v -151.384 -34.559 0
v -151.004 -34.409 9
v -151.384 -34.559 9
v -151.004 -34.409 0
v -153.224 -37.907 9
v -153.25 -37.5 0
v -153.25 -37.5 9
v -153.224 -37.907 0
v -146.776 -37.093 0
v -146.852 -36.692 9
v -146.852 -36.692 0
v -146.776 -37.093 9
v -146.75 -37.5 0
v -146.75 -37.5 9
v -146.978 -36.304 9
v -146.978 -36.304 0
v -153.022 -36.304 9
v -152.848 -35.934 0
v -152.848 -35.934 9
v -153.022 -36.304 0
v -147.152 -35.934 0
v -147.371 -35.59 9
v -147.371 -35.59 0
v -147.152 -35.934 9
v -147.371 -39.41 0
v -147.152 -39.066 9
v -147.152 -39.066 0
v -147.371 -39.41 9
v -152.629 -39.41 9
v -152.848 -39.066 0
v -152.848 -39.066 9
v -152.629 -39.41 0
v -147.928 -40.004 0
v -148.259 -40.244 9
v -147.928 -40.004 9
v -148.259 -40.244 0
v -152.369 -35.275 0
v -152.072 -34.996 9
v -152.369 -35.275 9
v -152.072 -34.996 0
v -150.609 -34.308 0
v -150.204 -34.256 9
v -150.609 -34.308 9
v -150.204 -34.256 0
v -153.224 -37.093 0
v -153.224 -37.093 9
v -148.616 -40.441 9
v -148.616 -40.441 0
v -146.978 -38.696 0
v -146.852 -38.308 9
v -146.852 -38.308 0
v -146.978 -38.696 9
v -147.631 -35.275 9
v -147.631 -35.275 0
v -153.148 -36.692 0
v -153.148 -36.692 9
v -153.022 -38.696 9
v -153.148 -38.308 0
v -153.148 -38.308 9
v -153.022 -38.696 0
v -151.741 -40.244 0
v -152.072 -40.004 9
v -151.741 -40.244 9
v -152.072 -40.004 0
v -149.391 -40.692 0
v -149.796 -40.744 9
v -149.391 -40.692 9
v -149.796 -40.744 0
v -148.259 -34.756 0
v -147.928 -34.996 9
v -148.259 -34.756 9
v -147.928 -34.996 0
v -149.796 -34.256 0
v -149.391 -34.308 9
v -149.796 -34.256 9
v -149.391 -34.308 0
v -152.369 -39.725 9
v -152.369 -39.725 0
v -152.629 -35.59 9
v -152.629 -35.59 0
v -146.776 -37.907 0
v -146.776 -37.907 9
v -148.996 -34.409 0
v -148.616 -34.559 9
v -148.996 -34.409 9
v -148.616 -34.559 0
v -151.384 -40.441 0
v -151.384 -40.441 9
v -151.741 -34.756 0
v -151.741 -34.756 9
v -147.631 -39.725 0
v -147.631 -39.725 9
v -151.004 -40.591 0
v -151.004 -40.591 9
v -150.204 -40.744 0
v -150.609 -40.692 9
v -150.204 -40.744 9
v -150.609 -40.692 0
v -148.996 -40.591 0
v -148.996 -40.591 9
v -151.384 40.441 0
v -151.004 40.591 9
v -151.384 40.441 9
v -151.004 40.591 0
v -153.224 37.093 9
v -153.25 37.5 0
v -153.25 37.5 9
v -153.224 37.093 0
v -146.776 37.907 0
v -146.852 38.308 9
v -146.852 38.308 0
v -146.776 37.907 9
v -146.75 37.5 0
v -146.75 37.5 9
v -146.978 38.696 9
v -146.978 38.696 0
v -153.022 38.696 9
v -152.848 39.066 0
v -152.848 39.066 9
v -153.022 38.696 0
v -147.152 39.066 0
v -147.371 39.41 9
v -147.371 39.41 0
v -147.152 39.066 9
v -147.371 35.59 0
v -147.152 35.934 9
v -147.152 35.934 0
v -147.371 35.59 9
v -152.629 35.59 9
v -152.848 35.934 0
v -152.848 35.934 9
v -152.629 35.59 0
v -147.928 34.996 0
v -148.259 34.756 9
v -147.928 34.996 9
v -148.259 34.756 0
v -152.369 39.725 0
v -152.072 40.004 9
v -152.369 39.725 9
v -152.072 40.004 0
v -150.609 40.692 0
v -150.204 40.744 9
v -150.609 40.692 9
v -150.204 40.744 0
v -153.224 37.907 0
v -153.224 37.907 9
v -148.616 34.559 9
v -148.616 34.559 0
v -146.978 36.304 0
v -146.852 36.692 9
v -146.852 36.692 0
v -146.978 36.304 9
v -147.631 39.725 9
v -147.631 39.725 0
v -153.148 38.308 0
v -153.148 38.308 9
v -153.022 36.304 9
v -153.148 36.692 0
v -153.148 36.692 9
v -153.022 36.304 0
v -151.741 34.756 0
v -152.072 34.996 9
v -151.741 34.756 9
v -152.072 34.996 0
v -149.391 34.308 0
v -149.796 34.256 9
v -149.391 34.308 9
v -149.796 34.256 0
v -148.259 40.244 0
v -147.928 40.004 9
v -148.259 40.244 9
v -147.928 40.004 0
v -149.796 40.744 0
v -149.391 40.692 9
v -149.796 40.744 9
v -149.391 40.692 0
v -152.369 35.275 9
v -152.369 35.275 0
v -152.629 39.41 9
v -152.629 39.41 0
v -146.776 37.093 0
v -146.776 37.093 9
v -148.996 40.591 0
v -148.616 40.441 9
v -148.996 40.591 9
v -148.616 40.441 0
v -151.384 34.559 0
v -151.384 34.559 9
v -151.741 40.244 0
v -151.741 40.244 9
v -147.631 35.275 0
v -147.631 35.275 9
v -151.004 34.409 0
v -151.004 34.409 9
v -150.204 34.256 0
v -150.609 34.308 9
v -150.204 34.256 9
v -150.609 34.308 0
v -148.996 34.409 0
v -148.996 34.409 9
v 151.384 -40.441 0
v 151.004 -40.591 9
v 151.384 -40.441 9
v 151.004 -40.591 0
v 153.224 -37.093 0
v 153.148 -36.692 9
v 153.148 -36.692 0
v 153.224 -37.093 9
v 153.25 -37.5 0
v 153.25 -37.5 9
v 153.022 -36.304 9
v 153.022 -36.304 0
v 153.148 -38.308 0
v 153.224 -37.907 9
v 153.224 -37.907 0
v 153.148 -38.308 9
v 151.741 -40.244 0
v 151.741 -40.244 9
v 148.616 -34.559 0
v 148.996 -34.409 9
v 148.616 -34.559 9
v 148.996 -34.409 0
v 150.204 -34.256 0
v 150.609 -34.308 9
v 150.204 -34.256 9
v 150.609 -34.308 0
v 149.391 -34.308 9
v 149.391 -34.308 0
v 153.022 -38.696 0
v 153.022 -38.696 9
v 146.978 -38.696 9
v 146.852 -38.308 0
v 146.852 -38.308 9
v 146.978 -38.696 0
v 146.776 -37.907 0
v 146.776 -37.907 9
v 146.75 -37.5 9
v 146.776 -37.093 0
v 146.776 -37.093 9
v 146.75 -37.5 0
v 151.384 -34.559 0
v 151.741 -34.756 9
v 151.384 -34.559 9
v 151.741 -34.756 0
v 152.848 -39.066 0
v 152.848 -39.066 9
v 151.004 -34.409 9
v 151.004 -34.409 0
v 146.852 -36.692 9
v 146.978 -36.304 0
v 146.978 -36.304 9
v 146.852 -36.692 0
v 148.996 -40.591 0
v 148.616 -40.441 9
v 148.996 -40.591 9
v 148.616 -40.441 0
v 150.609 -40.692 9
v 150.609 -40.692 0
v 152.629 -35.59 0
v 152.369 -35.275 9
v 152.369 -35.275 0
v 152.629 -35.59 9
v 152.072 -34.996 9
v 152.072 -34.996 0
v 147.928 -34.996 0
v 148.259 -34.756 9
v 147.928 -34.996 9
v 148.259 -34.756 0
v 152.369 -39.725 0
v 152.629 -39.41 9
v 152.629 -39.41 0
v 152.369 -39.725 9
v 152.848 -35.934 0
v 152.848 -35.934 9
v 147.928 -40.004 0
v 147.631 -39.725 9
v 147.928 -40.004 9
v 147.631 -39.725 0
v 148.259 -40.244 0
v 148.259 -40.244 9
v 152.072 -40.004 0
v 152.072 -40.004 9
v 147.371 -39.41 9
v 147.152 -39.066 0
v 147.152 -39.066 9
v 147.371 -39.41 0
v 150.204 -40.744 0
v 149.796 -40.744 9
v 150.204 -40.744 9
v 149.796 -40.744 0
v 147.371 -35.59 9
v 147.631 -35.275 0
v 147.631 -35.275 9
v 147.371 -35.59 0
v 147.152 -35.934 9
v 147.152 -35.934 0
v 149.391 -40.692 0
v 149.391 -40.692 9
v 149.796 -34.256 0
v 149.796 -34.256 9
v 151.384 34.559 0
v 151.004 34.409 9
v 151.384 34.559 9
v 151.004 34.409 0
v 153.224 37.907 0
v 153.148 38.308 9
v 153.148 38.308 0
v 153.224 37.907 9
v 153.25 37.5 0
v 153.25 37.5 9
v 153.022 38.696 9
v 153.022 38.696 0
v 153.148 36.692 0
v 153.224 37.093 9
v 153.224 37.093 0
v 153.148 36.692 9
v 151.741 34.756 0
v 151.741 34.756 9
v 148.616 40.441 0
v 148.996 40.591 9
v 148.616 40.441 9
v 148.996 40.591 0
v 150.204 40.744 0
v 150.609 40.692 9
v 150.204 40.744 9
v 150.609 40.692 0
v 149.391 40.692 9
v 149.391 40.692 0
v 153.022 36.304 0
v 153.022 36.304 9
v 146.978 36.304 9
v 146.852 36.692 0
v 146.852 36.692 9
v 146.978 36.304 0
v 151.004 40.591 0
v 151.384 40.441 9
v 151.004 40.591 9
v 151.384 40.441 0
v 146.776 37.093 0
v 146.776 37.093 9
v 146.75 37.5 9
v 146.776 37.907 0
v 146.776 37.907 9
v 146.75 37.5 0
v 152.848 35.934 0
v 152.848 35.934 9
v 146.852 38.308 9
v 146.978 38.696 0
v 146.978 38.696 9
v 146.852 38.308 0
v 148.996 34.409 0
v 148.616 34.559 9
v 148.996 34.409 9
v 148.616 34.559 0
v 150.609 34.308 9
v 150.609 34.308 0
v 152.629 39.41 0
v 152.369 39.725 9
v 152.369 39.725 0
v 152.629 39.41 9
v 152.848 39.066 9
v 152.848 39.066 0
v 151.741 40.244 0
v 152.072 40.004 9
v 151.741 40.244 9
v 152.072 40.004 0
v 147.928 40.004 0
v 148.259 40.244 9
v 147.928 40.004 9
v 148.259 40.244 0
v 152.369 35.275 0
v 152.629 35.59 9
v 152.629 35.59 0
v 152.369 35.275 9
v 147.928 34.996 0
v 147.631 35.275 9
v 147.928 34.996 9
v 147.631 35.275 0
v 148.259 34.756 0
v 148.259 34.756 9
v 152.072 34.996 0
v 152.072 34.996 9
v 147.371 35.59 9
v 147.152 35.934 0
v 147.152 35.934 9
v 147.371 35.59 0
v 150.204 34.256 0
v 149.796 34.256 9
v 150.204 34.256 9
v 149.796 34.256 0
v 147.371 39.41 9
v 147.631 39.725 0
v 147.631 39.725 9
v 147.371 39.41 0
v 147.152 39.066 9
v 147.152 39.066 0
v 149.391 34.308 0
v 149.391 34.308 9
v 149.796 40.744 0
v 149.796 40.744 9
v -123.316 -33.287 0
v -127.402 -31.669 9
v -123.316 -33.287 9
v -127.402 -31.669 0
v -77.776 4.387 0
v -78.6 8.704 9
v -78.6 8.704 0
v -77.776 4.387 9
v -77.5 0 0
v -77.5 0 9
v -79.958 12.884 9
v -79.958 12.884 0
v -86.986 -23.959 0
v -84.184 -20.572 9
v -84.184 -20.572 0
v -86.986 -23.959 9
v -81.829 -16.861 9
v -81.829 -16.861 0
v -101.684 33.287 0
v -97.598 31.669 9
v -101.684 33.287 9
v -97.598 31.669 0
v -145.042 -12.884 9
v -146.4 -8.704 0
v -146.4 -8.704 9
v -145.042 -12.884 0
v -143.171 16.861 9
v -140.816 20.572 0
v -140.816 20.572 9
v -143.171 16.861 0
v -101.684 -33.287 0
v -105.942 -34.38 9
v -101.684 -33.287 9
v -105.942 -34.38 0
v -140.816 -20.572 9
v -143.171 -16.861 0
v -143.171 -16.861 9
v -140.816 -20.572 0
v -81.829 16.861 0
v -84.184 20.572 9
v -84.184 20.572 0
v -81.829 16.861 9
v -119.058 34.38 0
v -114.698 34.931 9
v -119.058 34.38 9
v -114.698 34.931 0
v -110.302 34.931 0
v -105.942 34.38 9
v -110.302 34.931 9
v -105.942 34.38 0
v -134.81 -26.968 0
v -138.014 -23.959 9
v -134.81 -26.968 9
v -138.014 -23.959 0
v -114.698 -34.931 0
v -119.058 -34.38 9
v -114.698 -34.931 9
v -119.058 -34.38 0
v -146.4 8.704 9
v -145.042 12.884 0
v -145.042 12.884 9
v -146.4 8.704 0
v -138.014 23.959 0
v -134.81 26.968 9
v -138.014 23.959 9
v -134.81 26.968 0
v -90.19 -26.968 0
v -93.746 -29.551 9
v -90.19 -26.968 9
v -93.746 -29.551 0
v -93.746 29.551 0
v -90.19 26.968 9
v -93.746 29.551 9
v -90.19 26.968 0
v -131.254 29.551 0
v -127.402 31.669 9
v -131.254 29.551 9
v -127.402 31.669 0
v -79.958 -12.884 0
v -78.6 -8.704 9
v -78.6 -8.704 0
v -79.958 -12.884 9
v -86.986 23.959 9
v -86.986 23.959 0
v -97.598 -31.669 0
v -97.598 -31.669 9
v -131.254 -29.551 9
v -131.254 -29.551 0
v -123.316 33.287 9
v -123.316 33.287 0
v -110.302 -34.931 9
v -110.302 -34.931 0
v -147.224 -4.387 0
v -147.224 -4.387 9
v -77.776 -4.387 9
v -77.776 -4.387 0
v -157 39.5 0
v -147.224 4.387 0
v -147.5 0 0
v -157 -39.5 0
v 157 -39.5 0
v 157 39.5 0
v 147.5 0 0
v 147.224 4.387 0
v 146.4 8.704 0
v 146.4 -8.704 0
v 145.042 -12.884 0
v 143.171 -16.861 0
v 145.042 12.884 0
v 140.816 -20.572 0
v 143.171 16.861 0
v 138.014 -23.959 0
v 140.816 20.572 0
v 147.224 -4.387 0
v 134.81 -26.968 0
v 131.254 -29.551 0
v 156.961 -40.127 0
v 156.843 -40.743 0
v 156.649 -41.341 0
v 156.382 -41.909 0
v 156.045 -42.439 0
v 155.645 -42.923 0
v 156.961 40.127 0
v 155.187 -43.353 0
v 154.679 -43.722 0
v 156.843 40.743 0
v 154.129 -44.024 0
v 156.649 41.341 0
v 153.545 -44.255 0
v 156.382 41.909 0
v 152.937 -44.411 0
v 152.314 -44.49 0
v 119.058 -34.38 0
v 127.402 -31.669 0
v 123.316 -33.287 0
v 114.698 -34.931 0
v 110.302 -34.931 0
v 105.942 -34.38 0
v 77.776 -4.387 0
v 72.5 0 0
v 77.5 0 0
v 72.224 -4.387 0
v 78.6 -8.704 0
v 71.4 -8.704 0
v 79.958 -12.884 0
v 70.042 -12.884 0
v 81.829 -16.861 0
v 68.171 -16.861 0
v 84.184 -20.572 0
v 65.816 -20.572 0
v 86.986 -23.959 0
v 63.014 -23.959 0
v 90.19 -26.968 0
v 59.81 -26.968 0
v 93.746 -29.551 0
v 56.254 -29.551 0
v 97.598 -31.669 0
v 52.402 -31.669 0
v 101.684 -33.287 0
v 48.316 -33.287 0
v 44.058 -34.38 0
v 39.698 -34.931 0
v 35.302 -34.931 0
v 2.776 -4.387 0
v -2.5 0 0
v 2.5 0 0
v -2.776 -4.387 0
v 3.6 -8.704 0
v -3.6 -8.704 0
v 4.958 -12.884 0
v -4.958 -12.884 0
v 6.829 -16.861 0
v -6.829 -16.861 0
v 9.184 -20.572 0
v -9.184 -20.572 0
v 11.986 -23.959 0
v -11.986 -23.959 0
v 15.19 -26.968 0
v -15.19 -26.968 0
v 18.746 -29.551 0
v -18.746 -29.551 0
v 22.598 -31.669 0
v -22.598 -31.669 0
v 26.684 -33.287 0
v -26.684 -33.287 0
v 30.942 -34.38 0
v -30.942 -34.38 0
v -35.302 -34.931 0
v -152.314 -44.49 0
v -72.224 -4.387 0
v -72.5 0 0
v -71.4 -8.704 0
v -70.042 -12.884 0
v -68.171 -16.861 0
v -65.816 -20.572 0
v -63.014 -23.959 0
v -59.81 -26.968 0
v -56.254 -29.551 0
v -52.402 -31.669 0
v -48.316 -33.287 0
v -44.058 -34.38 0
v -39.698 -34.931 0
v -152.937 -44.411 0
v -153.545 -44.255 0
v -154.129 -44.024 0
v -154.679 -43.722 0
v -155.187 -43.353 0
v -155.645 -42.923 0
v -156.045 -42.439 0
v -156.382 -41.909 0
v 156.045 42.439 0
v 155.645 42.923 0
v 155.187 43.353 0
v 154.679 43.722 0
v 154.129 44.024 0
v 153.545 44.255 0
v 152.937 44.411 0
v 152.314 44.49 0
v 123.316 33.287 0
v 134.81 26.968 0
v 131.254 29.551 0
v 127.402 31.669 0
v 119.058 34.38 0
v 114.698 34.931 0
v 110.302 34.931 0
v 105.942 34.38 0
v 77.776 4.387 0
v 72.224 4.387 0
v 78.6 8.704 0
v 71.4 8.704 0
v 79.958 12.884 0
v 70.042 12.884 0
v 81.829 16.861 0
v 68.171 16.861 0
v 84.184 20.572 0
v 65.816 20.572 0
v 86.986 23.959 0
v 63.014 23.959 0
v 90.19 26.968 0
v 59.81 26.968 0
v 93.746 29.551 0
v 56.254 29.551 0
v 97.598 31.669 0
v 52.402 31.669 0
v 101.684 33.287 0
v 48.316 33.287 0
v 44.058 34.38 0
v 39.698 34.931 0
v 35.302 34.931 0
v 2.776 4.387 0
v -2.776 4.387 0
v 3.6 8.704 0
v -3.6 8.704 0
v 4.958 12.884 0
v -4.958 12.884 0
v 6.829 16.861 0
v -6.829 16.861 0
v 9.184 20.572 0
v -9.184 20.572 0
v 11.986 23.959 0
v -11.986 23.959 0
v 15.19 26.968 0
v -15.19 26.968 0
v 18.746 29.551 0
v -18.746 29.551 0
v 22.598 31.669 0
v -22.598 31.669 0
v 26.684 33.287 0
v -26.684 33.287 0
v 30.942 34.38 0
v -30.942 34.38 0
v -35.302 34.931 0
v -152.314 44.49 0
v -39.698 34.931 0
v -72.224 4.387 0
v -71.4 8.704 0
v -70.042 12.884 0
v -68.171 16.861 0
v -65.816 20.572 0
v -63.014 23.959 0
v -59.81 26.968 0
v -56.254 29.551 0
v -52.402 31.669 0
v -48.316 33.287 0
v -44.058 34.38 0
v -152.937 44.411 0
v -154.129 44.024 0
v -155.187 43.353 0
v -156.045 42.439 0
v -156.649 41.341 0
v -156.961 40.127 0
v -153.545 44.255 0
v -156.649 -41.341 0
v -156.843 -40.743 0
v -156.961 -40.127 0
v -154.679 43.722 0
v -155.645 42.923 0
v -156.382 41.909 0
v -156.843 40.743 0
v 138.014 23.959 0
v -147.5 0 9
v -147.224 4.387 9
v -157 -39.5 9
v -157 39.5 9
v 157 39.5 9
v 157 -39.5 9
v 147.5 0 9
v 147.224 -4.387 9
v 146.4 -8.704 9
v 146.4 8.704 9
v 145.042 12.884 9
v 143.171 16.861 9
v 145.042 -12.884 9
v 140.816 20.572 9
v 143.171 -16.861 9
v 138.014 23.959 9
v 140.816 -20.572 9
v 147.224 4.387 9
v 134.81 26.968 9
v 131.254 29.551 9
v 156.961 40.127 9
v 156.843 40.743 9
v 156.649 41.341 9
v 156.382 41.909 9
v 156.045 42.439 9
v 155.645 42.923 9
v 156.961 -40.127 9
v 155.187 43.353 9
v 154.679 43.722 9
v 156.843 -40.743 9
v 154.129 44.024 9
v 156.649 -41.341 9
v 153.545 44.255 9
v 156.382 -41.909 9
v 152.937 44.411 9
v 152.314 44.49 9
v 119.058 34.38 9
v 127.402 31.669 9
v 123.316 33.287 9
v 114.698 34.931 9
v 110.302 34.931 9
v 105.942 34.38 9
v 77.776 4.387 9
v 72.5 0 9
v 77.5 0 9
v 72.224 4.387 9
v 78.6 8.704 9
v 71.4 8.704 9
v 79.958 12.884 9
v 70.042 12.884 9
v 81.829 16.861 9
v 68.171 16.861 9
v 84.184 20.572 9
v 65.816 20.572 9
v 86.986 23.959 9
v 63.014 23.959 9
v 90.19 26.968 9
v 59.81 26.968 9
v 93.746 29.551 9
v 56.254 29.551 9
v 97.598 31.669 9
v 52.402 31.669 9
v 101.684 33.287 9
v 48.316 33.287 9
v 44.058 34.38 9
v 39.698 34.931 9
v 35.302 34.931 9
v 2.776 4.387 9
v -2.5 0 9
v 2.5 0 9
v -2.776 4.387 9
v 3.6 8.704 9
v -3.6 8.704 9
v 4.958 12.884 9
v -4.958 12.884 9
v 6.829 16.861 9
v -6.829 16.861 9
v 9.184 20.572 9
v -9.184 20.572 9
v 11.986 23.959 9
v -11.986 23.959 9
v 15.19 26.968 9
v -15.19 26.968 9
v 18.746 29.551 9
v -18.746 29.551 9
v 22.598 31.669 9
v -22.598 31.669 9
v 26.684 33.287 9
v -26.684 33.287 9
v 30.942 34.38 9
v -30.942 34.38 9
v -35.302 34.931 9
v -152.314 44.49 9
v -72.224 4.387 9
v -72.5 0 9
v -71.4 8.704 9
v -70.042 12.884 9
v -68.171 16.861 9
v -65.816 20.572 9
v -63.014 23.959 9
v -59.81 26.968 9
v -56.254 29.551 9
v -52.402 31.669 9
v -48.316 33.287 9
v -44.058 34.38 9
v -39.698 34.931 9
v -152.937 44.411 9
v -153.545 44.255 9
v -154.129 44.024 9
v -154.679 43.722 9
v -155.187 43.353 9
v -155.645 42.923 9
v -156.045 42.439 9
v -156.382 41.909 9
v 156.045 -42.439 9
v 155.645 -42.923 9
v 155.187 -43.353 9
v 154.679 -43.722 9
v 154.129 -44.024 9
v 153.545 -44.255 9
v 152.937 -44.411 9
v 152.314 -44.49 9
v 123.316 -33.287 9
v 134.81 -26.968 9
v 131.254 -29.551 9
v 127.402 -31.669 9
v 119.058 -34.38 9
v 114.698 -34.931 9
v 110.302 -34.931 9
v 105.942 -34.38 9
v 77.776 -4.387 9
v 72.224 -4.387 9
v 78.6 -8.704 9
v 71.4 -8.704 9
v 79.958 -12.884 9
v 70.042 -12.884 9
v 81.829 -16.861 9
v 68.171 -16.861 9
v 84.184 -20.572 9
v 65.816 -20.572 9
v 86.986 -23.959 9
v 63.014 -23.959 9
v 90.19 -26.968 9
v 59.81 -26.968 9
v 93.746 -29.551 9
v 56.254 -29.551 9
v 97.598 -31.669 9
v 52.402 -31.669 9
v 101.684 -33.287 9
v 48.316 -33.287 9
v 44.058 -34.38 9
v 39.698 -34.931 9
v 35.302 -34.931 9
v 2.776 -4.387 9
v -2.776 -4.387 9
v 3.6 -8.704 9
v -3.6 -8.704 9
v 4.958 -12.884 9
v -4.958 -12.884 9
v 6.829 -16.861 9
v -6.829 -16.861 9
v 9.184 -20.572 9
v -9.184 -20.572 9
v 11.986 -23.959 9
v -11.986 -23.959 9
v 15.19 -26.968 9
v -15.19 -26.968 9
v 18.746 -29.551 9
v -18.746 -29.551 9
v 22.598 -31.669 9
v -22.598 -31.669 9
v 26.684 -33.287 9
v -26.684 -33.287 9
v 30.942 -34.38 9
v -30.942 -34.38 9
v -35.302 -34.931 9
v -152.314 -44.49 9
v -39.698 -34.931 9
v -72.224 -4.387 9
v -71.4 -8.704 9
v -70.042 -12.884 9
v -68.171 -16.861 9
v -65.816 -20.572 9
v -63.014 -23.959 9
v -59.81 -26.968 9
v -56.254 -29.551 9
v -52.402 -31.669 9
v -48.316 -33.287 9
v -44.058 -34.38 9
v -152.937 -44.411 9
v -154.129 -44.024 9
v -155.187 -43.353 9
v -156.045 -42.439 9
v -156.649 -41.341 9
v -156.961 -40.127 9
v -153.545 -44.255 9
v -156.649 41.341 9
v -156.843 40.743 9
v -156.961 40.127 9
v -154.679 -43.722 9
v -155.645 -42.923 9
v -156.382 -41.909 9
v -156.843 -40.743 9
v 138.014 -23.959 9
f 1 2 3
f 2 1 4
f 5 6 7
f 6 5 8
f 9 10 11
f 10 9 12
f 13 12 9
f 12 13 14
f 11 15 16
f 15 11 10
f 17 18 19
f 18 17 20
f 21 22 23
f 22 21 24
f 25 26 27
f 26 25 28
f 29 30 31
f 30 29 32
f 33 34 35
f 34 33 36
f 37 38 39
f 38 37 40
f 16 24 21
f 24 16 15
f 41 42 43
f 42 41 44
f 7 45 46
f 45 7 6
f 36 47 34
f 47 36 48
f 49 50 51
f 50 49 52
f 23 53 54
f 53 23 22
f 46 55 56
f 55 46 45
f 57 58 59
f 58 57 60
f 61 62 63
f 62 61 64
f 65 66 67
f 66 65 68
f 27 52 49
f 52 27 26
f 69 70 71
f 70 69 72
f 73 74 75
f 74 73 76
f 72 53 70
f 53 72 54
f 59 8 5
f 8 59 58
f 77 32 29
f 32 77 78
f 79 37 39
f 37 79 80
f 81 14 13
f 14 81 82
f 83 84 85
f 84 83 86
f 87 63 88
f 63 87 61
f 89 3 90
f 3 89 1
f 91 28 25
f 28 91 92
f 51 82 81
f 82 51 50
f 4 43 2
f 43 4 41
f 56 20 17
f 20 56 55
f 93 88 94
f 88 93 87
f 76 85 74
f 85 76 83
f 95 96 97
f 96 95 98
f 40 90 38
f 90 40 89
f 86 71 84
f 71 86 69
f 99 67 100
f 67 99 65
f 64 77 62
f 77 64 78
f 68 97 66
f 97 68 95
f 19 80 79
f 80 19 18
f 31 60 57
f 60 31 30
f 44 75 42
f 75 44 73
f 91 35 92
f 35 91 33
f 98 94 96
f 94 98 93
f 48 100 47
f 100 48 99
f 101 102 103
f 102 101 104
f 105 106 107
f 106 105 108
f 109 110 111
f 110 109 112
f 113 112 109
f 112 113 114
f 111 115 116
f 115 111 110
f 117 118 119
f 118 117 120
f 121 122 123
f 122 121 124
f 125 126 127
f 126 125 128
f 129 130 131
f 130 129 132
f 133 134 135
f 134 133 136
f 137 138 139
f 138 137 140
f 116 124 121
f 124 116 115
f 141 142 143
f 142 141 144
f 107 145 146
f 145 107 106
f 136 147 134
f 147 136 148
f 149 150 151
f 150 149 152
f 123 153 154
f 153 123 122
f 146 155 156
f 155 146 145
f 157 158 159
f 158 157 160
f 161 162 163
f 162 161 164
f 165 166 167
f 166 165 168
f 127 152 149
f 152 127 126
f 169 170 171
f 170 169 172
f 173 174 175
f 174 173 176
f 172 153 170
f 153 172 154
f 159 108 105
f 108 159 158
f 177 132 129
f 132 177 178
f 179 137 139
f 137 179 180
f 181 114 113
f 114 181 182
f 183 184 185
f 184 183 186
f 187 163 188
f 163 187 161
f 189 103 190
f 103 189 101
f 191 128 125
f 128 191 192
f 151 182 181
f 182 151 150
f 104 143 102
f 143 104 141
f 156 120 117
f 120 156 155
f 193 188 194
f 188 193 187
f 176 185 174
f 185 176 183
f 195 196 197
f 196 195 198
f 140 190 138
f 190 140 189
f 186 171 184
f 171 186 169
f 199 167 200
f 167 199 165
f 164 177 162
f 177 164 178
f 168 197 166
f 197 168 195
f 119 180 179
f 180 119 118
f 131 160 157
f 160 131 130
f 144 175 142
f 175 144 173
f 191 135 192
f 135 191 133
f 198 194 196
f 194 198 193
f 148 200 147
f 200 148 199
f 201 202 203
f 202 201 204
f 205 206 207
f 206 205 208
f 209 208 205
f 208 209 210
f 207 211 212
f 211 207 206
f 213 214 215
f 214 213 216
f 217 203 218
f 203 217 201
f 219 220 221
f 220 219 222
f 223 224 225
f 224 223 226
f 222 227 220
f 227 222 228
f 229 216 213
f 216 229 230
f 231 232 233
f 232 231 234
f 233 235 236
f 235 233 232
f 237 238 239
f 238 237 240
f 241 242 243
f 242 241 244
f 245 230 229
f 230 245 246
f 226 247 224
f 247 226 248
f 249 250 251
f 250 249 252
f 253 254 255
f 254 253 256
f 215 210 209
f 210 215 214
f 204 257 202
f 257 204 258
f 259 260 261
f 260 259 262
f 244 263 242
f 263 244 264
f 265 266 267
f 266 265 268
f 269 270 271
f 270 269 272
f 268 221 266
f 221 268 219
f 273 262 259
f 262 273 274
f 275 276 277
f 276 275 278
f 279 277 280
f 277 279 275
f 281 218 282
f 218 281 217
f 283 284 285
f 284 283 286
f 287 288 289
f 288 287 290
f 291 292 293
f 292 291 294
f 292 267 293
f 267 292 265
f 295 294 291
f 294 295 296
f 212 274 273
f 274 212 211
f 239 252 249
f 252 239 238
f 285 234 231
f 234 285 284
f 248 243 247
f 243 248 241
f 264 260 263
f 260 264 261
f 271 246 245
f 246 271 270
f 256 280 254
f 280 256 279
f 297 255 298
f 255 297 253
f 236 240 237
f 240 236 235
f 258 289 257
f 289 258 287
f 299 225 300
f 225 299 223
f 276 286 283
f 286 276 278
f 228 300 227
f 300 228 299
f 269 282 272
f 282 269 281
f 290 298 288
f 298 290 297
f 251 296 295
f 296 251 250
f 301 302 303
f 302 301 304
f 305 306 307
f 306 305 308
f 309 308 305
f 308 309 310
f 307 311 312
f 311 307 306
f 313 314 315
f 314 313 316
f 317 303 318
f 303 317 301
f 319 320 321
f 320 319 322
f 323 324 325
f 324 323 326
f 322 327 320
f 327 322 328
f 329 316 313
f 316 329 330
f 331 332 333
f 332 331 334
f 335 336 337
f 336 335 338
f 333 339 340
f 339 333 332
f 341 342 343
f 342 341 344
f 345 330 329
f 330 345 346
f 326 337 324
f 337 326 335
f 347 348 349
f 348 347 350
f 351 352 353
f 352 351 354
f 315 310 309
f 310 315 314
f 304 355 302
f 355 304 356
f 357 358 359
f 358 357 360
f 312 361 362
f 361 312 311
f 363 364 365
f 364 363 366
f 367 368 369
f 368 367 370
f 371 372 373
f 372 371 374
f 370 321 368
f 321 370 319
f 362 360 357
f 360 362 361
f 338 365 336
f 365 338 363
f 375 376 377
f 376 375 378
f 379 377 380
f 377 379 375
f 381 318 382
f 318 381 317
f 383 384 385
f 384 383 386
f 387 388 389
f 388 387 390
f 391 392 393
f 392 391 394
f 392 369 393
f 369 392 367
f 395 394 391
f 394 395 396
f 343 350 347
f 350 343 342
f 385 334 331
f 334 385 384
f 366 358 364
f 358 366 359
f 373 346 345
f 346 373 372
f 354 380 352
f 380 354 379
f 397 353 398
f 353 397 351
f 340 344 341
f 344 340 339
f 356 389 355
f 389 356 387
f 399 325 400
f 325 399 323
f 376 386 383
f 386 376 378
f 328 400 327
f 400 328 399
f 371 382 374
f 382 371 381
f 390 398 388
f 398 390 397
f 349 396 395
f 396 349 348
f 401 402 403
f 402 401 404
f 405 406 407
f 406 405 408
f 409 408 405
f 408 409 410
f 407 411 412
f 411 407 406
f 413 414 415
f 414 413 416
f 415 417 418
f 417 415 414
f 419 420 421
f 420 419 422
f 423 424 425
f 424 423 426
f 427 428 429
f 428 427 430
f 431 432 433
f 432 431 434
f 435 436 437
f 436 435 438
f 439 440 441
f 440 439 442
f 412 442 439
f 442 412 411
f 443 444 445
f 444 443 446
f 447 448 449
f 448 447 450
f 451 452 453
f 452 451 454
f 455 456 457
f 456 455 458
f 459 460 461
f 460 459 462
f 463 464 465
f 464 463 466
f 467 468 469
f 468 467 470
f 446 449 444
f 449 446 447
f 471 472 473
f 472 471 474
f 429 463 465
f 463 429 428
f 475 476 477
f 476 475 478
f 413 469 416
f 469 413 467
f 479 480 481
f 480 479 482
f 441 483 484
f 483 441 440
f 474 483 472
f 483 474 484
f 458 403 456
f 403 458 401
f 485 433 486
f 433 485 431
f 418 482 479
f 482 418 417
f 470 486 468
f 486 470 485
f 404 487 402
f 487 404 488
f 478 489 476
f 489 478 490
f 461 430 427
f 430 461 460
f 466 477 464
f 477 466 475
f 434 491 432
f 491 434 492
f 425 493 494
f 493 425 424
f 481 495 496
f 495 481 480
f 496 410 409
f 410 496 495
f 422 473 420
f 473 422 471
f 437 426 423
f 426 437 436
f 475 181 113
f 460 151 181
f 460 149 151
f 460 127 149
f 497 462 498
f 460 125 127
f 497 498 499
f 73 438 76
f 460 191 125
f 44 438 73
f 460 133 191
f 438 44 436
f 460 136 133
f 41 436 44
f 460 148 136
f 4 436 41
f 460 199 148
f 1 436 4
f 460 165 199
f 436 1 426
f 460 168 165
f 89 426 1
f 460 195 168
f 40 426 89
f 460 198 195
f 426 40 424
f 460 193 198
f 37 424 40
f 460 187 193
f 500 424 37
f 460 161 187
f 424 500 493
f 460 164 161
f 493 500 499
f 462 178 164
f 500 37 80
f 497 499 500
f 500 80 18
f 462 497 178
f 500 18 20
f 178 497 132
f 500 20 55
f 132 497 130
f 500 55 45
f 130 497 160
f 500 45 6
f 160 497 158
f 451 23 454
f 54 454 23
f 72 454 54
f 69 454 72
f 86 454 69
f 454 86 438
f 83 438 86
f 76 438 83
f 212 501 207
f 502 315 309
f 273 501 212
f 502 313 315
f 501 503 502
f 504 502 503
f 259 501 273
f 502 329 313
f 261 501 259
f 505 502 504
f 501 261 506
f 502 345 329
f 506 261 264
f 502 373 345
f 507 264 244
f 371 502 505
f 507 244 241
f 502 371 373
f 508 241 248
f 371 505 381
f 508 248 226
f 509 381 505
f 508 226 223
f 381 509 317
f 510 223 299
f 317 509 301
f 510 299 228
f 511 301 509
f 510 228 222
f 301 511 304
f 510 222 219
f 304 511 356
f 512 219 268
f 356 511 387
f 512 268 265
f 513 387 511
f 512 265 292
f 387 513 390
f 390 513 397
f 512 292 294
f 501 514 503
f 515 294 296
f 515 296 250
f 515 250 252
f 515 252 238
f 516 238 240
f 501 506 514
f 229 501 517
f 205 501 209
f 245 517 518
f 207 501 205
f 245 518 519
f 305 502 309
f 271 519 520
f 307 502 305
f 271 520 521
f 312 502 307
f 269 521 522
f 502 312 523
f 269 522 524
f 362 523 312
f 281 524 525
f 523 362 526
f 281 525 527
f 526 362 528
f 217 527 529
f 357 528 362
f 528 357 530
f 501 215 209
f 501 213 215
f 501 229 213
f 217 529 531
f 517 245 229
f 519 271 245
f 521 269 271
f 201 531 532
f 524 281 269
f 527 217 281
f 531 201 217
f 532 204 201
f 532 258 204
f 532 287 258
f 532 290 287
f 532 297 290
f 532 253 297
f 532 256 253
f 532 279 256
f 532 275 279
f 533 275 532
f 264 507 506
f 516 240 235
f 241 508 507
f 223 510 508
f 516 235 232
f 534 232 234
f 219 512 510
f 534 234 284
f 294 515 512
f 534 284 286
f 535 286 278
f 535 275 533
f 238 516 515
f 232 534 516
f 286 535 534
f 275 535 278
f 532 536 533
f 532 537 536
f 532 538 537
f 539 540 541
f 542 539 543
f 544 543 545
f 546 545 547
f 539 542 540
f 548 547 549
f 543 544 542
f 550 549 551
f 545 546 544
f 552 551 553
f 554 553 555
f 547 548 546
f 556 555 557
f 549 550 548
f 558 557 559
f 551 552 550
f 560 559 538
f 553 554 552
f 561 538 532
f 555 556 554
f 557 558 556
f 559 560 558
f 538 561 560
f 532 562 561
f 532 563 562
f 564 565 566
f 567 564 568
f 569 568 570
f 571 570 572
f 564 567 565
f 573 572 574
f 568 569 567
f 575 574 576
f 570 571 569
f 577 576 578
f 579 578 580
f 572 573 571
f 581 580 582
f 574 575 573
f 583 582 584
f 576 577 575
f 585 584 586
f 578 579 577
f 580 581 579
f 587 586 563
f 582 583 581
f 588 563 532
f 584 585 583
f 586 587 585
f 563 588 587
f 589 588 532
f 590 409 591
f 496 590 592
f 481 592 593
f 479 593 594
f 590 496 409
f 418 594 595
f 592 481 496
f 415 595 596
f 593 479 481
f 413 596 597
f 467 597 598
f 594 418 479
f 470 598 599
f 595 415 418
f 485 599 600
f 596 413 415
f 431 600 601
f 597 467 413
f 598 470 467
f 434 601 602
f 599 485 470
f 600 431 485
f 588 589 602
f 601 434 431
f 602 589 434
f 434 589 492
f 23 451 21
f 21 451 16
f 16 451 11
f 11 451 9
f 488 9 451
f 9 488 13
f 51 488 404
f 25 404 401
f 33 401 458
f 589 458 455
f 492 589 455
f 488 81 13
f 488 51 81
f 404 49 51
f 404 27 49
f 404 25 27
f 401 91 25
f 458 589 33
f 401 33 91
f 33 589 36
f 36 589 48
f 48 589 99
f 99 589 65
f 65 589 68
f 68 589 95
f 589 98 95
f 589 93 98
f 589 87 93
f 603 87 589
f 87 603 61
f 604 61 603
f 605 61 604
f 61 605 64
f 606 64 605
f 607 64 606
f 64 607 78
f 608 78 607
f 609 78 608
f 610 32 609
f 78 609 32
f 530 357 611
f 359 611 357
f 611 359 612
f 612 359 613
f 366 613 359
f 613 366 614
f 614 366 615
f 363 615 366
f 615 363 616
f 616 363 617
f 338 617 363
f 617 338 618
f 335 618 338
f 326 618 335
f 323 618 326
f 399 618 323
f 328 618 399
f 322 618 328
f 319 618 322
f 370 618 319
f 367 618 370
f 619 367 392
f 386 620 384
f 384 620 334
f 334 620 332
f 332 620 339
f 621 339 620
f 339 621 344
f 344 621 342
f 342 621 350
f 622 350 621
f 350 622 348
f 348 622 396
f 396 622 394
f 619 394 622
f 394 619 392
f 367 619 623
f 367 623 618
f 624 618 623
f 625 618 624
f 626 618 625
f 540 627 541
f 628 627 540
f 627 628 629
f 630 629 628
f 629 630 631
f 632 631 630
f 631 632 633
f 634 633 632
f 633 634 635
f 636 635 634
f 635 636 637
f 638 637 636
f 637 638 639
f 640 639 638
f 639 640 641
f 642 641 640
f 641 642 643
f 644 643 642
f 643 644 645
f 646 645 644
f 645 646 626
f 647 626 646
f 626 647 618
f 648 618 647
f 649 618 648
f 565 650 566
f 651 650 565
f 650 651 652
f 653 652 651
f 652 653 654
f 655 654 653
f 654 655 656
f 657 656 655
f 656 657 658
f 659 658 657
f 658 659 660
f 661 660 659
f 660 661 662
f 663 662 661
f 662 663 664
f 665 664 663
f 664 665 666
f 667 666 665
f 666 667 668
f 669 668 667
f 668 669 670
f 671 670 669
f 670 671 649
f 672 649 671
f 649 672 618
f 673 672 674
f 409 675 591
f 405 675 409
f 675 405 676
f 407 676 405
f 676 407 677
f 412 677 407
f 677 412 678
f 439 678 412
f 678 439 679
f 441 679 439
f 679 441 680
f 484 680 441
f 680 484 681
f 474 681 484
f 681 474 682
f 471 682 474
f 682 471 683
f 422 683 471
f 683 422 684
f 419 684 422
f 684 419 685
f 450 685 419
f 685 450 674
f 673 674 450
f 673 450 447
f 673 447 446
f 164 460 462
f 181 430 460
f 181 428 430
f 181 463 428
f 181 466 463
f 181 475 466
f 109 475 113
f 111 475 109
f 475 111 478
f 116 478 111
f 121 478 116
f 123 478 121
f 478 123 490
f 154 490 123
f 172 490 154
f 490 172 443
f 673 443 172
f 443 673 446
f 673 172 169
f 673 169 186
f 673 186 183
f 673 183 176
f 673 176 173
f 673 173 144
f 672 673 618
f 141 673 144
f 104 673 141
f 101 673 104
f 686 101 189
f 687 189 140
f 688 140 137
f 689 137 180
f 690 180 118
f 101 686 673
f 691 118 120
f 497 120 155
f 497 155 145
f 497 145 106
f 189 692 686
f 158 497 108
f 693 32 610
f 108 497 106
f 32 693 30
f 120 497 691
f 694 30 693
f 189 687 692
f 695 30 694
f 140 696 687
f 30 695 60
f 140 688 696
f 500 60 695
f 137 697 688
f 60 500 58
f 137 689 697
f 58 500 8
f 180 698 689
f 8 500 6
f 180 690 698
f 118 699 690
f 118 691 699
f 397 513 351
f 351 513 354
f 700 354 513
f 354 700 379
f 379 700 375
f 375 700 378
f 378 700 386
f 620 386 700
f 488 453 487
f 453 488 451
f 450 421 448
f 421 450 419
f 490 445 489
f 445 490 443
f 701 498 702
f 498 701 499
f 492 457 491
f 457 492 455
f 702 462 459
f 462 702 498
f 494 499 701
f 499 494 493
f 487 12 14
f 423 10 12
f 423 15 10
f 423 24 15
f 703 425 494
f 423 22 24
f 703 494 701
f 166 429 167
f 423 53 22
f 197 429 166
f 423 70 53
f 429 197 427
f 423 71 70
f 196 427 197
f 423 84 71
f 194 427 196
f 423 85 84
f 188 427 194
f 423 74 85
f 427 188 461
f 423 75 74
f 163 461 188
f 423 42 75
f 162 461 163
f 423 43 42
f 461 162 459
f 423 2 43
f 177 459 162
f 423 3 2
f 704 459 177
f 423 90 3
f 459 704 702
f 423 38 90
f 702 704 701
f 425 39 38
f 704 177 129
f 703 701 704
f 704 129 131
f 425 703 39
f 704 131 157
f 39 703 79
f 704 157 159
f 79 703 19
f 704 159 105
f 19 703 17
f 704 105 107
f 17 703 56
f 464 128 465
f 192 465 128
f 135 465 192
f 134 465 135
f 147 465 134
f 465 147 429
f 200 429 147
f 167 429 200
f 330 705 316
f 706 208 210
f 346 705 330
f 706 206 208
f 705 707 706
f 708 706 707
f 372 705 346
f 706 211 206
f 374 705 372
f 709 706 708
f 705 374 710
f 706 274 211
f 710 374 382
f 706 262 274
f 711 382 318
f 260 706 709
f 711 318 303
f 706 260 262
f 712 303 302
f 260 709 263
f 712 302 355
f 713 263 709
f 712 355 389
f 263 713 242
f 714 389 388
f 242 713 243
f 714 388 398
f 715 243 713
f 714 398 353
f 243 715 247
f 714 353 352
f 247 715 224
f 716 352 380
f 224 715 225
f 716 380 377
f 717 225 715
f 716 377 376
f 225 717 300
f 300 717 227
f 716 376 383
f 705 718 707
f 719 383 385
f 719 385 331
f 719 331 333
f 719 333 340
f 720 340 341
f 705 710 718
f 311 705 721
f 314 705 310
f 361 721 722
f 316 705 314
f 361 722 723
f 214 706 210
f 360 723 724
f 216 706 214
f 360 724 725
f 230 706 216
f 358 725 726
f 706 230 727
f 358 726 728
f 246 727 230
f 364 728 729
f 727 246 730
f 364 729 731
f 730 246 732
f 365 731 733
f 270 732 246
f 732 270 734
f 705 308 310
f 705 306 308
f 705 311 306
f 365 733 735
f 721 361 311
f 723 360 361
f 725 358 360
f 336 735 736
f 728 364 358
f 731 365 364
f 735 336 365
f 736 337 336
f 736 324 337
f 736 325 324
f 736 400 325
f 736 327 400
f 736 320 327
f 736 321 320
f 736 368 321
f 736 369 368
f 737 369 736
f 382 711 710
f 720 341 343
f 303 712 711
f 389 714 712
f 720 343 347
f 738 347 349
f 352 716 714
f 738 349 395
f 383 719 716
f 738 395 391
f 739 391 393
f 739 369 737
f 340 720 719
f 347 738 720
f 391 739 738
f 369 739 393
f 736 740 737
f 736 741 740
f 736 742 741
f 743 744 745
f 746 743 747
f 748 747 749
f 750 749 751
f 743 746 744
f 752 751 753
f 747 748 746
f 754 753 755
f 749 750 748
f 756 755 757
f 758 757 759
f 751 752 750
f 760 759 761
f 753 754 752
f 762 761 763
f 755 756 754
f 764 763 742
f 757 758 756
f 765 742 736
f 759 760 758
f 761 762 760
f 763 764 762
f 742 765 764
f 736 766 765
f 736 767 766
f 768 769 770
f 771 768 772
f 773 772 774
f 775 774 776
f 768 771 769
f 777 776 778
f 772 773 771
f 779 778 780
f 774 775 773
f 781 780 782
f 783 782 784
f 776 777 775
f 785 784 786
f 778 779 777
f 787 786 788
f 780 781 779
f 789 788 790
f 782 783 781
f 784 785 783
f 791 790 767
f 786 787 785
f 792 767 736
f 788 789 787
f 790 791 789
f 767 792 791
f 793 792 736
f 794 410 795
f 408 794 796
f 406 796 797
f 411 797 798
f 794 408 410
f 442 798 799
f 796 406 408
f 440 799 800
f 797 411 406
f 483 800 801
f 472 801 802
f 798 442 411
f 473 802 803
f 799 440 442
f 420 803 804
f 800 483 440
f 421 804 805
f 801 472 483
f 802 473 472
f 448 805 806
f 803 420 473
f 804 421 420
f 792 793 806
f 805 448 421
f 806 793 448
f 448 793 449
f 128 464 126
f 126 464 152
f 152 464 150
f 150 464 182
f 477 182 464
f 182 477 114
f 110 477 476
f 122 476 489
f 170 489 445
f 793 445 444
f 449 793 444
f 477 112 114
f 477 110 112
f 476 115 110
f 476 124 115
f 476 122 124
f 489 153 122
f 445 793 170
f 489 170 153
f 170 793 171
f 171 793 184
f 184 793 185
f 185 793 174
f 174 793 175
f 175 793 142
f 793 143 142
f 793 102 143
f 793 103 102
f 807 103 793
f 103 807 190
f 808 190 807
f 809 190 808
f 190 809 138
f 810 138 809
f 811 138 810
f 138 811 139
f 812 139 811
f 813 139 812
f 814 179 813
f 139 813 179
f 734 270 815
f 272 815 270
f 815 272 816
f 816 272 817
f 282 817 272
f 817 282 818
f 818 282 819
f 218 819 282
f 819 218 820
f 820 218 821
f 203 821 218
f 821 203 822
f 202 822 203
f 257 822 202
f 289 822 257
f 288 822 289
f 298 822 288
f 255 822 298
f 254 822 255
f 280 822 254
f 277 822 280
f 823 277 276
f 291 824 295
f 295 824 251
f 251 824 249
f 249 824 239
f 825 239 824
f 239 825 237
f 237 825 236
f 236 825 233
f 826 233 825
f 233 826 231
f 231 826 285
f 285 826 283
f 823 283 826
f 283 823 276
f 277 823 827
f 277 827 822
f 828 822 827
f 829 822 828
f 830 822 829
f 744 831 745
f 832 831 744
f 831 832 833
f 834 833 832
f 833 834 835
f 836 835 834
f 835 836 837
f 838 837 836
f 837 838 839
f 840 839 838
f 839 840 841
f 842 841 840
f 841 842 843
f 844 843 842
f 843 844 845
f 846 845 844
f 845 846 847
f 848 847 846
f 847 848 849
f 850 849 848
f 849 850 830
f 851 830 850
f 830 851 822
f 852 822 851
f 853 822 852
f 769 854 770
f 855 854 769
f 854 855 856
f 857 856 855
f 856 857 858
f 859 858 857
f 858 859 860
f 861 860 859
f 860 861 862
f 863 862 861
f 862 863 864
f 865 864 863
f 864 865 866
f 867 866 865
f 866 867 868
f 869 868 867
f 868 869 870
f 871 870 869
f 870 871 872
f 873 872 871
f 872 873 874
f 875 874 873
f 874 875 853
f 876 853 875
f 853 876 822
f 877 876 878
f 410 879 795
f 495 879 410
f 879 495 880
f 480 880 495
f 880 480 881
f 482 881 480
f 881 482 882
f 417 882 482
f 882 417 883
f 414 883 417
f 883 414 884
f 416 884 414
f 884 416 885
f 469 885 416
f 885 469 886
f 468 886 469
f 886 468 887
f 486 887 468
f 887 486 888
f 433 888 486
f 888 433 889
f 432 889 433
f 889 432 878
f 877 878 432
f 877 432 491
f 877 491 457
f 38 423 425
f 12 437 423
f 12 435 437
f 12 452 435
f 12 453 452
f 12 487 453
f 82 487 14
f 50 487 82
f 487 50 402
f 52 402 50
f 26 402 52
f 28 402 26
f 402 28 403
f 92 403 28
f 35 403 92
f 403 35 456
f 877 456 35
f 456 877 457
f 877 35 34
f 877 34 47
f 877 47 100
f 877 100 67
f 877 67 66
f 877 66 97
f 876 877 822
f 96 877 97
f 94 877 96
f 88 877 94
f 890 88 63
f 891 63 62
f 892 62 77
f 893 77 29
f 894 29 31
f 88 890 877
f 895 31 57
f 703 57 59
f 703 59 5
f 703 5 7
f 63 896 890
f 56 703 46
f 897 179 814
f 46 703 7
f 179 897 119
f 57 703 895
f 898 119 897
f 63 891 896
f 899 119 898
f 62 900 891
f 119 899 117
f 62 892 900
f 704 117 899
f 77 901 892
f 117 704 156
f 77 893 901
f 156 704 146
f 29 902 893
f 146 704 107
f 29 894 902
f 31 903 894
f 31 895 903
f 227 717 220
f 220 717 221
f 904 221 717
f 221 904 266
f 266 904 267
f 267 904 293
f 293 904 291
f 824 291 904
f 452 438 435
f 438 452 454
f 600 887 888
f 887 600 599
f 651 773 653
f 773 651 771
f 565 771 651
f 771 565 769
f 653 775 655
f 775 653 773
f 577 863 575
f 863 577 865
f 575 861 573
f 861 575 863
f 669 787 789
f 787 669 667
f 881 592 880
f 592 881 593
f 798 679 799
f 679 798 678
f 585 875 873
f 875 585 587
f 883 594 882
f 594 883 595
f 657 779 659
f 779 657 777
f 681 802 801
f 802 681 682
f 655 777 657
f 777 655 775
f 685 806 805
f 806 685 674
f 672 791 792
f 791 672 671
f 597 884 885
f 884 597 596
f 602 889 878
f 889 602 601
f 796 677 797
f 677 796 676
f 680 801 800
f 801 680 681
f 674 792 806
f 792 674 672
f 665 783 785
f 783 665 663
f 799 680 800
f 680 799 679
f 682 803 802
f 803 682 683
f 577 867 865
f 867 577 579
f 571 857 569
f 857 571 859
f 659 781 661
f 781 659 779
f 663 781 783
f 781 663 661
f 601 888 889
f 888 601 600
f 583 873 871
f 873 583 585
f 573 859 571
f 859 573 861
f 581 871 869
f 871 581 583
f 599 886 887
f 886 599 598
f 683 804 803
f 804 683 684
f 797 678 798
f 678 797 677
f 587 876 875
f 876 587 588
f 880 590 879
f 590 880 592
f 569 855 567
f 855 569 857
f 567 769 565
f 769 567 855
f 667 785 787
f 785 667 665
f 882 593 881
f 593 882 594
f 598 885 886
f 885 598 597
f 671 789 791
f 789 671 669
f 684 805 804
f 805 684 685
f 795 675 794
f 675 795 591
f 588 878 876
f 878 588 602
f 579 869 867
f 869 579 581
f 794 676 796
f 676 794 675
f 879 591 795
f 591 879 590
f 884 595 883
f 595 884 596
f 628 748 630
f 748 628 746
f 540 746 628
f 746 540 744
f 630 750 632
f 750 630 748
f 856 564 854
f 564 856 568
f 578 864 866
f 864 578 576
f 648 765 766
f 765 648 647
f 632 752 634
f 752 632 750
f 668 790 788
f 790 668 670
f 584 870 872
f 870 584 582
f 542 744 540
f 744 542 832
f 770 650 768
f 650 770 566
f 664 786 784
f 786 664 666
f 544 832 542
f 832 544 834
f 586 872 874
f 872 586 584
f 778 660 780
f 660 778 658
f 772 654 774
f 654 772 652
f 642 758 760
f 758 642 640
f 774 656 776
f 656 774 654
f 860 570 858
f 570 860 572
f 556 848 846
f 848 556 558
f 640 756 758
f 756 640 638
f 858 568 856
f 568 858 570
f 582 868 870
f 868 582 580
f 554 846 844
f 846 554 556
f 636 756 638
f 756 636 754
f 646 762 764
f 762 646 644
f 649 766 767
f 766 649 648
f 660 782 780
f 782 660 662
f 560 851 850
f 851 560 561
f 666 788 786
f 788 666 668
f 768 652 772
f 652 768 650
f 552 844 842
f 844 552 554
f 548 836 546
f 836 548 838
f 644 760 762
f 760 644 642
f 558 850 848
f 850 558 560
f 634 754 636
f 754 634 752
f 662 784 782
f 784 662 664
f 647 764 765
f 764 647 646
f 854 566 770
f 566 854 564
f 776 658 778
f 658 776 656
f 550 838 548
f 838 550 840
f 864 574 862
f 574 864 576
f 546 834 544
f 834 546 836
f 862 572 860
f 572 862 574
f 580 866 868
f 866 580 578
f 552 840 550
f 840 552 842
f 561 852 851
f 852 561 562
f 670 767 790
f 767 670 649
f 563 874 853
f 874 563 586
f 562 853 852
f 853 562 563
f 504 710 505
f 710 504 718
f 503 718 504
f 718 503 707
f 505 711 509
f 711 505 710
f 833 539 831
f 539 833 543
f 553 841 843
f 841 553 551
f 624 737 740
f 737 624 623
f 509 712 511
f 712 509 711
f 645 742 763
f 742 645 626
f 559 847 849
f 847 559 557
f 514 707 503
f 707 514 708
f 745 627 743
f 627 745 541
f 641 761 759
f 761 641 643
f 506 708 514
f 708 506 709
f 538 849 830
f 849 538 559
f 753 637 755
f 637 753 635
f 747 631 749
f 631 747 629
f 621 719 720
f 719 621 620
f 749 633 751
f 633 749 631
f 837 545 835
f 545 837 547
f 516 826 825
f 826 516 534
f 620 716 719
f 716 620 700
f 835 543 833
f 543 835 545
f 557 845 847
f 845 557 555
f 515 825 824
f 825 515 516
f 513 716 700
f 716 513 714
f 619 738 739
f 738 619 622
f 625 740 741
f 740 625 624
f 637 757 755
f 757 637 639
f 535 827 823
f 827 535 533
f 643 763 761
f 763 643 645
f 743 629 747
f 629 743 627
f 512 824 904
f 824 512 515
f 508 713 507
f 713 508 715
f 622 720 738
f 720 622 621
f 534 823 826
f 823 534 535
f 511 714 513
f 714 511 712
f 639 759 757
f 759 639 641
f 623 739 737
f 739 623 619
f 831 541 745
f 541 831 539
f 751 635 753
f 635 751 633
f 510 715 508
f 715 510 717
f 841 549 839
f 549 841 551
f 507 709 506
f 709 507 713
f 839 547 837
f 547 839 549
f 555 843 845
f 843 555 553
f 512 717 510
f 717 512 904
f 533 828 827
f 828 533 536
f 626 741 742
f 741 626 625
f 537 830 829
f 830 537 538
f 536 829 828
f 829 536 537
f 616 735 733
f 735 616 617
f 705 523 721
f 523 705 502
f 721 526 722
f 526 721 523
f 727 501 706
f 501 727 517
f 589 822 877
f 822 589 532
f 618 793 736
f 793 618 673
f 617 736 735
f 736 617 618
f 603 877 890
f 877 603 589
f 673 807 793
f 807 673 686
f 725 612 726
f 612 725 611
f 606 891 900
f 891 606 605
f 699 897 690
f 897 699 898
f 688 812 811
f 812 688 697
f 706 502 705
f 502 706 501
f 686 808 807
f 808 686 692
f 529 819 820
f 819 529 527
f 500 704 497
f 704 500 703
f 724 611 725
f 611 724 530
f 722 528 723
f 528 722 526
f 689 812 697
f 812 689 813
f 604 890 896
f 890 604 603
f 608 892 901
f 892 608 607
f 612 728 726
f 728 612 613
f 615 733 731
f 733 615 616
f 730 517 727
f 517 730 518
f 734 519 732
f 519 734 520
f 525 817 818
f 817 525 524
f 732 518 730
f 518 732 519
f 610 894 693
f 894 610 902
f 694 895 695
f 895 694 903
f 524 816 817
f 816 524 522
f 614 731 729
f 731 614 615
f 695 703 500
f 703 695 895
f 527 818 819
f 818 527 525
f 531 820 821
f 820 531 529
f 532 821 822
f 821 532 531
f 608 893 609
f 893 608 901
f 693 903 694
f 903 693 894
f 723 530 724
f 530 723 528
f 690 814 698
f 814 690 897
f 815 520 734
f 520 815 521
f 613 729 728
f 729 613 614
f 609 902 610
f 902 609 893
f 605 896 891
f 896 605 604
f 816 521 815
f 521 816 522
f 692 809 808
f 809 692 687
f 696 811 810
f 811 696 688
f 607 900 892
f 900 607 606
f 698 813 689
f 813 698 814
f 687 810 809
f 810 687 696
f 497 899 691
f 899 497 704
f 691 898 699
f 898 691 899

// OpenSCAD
$fn = 50;


difference() {
	union() {
		hull() {
			translate(v = [-152.0000000000, 39.5000000000, 0]) {
				cylinder(h = 9, r = 5);
			}
			translate(v = [152.0000000000, 39.5000000000, 0]) {
				cylinder(h = 9, r = 5);
			}
			translate(v = [-152.0000000000, -39.5000000000, 0]) {
				cylinder(h = 9, r = 5);
			}
			translate(v = [152.0000000000, -39.5000000000, 0]) {
				cylinder(h = 9, r = 5);
			}
		}
	}
	union() {
		#translate(v = [-150.0000000000, -37.5000000000, -100.0000000000]) {
			cylinder(h = 200, r = 3.2500000000);
		}
		#translate(v = [-150.0000000000, 37.5000000000, -100.0000000000]) {
			cylinder(h = 200, r = 3.2500000000);
		}
		#translate(v = [150.0000000000, -37.5000000000, -100.0000000000]) {
			cylinder(h = 200, r = 3.2500000000);
		}
		#translate(v = [150.0000000000, 37.5000000000, -100.0000000000]) {
			cylinder(h = 200, r = 3.2500000000);
		}
		#translate(v = [-112.5000000000, 0, 0]) {
			cylinder(h = 9, r = 35.0000000000);
		}
		#translate(v = [-37.5000000000, 0, 0]) {
			cylinder(h = 9, r = 35.0000000000);
		}
		#translate(v = [37.5000000000, 0, 0]) {
			cylinder(h = 9, r = 35.0000000000);
		}
		#translate(v = [112.5000000000, 0, 0]) {
			cylinder(h = 9, r = 35.0000000000);
		}
	}
}
